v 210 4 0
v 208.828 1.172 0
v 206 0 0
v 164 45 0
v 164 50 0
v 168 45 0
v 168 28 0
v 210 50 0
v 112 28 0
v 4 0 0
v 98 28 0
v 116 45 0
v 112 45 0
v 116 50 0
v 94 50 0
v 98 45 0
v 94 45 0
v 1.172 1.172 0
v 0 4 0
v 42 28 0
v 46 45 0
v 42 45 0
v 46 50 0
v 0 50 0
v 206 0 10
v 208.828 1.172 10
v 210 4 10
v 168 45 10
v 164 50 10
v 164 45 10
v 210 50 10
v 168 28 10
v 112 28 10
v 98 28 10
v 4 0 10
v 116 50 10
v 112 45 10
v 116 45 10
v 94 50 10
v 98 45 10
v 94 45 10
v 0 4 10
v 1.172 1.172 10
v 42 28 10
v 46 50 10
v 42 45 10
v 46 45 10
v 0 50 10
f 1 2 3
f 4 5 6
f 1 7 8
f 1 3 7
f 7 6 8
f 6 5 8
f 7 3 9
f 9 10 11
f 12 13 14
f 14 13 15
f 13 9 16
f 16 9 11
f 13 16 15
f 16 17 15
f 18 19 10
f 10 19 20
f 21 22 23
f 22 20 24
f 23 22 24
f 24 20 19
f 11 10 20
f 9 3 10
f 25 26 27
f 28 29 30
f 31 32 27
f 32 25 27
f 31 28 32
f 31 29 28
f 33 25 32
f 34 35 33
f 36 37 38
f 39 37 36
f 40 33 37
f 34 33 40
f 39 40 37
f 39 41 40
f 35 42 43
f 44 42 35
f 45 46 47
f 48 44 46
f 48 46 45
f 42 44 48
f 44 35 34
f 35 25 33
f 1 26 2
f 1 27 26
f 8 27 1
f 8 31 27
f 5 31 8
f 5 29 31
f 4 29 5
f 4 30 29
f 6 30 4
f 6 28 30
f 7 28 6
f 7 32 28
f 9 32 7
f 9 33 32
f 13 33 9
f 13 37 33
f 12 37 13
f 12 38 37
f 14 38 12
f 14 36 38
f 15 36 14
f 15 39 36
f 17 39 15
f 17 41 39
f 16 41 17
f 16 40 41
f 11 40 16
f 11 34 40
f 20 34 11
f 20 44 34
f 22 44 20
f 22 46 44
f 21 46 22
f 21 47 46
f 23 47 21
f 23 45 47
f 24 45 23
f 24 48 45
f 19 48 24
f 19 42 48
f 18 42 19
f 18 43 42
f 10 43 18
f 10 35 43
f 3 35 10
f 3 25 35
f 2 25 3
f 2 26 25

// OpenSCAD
$fn = 32;

// ----------------------------------------------------------------------
// Oversize slot bar: 210 mm bar with 2 oversize windows
// ----------------------------------------------------------------------

// --- parameters (mm) ---
profile_height = 10;      // extrusion height
profile_points = 24;      // points of the closed outline

profile = [[0, 4], [1.172, 1.172], [4, 0], [206, 0], [208.828, 1.172], [210, 4], [210, 50], [164, 50], [164, 45], [168, 45], [168, 28], [112, 28], [112, 45], [116, 45], [116, 50], [94, 50], [94, 45], [98, 45], [98, 28], [42, 28], [42, 45], [46, 45], [46, 50], [0, 50]];  // single closed polygon, 24 points, counter clockwise

// --- the one profile operation ---
linear_extrude(height = profile_height) polygon(points = profile);
